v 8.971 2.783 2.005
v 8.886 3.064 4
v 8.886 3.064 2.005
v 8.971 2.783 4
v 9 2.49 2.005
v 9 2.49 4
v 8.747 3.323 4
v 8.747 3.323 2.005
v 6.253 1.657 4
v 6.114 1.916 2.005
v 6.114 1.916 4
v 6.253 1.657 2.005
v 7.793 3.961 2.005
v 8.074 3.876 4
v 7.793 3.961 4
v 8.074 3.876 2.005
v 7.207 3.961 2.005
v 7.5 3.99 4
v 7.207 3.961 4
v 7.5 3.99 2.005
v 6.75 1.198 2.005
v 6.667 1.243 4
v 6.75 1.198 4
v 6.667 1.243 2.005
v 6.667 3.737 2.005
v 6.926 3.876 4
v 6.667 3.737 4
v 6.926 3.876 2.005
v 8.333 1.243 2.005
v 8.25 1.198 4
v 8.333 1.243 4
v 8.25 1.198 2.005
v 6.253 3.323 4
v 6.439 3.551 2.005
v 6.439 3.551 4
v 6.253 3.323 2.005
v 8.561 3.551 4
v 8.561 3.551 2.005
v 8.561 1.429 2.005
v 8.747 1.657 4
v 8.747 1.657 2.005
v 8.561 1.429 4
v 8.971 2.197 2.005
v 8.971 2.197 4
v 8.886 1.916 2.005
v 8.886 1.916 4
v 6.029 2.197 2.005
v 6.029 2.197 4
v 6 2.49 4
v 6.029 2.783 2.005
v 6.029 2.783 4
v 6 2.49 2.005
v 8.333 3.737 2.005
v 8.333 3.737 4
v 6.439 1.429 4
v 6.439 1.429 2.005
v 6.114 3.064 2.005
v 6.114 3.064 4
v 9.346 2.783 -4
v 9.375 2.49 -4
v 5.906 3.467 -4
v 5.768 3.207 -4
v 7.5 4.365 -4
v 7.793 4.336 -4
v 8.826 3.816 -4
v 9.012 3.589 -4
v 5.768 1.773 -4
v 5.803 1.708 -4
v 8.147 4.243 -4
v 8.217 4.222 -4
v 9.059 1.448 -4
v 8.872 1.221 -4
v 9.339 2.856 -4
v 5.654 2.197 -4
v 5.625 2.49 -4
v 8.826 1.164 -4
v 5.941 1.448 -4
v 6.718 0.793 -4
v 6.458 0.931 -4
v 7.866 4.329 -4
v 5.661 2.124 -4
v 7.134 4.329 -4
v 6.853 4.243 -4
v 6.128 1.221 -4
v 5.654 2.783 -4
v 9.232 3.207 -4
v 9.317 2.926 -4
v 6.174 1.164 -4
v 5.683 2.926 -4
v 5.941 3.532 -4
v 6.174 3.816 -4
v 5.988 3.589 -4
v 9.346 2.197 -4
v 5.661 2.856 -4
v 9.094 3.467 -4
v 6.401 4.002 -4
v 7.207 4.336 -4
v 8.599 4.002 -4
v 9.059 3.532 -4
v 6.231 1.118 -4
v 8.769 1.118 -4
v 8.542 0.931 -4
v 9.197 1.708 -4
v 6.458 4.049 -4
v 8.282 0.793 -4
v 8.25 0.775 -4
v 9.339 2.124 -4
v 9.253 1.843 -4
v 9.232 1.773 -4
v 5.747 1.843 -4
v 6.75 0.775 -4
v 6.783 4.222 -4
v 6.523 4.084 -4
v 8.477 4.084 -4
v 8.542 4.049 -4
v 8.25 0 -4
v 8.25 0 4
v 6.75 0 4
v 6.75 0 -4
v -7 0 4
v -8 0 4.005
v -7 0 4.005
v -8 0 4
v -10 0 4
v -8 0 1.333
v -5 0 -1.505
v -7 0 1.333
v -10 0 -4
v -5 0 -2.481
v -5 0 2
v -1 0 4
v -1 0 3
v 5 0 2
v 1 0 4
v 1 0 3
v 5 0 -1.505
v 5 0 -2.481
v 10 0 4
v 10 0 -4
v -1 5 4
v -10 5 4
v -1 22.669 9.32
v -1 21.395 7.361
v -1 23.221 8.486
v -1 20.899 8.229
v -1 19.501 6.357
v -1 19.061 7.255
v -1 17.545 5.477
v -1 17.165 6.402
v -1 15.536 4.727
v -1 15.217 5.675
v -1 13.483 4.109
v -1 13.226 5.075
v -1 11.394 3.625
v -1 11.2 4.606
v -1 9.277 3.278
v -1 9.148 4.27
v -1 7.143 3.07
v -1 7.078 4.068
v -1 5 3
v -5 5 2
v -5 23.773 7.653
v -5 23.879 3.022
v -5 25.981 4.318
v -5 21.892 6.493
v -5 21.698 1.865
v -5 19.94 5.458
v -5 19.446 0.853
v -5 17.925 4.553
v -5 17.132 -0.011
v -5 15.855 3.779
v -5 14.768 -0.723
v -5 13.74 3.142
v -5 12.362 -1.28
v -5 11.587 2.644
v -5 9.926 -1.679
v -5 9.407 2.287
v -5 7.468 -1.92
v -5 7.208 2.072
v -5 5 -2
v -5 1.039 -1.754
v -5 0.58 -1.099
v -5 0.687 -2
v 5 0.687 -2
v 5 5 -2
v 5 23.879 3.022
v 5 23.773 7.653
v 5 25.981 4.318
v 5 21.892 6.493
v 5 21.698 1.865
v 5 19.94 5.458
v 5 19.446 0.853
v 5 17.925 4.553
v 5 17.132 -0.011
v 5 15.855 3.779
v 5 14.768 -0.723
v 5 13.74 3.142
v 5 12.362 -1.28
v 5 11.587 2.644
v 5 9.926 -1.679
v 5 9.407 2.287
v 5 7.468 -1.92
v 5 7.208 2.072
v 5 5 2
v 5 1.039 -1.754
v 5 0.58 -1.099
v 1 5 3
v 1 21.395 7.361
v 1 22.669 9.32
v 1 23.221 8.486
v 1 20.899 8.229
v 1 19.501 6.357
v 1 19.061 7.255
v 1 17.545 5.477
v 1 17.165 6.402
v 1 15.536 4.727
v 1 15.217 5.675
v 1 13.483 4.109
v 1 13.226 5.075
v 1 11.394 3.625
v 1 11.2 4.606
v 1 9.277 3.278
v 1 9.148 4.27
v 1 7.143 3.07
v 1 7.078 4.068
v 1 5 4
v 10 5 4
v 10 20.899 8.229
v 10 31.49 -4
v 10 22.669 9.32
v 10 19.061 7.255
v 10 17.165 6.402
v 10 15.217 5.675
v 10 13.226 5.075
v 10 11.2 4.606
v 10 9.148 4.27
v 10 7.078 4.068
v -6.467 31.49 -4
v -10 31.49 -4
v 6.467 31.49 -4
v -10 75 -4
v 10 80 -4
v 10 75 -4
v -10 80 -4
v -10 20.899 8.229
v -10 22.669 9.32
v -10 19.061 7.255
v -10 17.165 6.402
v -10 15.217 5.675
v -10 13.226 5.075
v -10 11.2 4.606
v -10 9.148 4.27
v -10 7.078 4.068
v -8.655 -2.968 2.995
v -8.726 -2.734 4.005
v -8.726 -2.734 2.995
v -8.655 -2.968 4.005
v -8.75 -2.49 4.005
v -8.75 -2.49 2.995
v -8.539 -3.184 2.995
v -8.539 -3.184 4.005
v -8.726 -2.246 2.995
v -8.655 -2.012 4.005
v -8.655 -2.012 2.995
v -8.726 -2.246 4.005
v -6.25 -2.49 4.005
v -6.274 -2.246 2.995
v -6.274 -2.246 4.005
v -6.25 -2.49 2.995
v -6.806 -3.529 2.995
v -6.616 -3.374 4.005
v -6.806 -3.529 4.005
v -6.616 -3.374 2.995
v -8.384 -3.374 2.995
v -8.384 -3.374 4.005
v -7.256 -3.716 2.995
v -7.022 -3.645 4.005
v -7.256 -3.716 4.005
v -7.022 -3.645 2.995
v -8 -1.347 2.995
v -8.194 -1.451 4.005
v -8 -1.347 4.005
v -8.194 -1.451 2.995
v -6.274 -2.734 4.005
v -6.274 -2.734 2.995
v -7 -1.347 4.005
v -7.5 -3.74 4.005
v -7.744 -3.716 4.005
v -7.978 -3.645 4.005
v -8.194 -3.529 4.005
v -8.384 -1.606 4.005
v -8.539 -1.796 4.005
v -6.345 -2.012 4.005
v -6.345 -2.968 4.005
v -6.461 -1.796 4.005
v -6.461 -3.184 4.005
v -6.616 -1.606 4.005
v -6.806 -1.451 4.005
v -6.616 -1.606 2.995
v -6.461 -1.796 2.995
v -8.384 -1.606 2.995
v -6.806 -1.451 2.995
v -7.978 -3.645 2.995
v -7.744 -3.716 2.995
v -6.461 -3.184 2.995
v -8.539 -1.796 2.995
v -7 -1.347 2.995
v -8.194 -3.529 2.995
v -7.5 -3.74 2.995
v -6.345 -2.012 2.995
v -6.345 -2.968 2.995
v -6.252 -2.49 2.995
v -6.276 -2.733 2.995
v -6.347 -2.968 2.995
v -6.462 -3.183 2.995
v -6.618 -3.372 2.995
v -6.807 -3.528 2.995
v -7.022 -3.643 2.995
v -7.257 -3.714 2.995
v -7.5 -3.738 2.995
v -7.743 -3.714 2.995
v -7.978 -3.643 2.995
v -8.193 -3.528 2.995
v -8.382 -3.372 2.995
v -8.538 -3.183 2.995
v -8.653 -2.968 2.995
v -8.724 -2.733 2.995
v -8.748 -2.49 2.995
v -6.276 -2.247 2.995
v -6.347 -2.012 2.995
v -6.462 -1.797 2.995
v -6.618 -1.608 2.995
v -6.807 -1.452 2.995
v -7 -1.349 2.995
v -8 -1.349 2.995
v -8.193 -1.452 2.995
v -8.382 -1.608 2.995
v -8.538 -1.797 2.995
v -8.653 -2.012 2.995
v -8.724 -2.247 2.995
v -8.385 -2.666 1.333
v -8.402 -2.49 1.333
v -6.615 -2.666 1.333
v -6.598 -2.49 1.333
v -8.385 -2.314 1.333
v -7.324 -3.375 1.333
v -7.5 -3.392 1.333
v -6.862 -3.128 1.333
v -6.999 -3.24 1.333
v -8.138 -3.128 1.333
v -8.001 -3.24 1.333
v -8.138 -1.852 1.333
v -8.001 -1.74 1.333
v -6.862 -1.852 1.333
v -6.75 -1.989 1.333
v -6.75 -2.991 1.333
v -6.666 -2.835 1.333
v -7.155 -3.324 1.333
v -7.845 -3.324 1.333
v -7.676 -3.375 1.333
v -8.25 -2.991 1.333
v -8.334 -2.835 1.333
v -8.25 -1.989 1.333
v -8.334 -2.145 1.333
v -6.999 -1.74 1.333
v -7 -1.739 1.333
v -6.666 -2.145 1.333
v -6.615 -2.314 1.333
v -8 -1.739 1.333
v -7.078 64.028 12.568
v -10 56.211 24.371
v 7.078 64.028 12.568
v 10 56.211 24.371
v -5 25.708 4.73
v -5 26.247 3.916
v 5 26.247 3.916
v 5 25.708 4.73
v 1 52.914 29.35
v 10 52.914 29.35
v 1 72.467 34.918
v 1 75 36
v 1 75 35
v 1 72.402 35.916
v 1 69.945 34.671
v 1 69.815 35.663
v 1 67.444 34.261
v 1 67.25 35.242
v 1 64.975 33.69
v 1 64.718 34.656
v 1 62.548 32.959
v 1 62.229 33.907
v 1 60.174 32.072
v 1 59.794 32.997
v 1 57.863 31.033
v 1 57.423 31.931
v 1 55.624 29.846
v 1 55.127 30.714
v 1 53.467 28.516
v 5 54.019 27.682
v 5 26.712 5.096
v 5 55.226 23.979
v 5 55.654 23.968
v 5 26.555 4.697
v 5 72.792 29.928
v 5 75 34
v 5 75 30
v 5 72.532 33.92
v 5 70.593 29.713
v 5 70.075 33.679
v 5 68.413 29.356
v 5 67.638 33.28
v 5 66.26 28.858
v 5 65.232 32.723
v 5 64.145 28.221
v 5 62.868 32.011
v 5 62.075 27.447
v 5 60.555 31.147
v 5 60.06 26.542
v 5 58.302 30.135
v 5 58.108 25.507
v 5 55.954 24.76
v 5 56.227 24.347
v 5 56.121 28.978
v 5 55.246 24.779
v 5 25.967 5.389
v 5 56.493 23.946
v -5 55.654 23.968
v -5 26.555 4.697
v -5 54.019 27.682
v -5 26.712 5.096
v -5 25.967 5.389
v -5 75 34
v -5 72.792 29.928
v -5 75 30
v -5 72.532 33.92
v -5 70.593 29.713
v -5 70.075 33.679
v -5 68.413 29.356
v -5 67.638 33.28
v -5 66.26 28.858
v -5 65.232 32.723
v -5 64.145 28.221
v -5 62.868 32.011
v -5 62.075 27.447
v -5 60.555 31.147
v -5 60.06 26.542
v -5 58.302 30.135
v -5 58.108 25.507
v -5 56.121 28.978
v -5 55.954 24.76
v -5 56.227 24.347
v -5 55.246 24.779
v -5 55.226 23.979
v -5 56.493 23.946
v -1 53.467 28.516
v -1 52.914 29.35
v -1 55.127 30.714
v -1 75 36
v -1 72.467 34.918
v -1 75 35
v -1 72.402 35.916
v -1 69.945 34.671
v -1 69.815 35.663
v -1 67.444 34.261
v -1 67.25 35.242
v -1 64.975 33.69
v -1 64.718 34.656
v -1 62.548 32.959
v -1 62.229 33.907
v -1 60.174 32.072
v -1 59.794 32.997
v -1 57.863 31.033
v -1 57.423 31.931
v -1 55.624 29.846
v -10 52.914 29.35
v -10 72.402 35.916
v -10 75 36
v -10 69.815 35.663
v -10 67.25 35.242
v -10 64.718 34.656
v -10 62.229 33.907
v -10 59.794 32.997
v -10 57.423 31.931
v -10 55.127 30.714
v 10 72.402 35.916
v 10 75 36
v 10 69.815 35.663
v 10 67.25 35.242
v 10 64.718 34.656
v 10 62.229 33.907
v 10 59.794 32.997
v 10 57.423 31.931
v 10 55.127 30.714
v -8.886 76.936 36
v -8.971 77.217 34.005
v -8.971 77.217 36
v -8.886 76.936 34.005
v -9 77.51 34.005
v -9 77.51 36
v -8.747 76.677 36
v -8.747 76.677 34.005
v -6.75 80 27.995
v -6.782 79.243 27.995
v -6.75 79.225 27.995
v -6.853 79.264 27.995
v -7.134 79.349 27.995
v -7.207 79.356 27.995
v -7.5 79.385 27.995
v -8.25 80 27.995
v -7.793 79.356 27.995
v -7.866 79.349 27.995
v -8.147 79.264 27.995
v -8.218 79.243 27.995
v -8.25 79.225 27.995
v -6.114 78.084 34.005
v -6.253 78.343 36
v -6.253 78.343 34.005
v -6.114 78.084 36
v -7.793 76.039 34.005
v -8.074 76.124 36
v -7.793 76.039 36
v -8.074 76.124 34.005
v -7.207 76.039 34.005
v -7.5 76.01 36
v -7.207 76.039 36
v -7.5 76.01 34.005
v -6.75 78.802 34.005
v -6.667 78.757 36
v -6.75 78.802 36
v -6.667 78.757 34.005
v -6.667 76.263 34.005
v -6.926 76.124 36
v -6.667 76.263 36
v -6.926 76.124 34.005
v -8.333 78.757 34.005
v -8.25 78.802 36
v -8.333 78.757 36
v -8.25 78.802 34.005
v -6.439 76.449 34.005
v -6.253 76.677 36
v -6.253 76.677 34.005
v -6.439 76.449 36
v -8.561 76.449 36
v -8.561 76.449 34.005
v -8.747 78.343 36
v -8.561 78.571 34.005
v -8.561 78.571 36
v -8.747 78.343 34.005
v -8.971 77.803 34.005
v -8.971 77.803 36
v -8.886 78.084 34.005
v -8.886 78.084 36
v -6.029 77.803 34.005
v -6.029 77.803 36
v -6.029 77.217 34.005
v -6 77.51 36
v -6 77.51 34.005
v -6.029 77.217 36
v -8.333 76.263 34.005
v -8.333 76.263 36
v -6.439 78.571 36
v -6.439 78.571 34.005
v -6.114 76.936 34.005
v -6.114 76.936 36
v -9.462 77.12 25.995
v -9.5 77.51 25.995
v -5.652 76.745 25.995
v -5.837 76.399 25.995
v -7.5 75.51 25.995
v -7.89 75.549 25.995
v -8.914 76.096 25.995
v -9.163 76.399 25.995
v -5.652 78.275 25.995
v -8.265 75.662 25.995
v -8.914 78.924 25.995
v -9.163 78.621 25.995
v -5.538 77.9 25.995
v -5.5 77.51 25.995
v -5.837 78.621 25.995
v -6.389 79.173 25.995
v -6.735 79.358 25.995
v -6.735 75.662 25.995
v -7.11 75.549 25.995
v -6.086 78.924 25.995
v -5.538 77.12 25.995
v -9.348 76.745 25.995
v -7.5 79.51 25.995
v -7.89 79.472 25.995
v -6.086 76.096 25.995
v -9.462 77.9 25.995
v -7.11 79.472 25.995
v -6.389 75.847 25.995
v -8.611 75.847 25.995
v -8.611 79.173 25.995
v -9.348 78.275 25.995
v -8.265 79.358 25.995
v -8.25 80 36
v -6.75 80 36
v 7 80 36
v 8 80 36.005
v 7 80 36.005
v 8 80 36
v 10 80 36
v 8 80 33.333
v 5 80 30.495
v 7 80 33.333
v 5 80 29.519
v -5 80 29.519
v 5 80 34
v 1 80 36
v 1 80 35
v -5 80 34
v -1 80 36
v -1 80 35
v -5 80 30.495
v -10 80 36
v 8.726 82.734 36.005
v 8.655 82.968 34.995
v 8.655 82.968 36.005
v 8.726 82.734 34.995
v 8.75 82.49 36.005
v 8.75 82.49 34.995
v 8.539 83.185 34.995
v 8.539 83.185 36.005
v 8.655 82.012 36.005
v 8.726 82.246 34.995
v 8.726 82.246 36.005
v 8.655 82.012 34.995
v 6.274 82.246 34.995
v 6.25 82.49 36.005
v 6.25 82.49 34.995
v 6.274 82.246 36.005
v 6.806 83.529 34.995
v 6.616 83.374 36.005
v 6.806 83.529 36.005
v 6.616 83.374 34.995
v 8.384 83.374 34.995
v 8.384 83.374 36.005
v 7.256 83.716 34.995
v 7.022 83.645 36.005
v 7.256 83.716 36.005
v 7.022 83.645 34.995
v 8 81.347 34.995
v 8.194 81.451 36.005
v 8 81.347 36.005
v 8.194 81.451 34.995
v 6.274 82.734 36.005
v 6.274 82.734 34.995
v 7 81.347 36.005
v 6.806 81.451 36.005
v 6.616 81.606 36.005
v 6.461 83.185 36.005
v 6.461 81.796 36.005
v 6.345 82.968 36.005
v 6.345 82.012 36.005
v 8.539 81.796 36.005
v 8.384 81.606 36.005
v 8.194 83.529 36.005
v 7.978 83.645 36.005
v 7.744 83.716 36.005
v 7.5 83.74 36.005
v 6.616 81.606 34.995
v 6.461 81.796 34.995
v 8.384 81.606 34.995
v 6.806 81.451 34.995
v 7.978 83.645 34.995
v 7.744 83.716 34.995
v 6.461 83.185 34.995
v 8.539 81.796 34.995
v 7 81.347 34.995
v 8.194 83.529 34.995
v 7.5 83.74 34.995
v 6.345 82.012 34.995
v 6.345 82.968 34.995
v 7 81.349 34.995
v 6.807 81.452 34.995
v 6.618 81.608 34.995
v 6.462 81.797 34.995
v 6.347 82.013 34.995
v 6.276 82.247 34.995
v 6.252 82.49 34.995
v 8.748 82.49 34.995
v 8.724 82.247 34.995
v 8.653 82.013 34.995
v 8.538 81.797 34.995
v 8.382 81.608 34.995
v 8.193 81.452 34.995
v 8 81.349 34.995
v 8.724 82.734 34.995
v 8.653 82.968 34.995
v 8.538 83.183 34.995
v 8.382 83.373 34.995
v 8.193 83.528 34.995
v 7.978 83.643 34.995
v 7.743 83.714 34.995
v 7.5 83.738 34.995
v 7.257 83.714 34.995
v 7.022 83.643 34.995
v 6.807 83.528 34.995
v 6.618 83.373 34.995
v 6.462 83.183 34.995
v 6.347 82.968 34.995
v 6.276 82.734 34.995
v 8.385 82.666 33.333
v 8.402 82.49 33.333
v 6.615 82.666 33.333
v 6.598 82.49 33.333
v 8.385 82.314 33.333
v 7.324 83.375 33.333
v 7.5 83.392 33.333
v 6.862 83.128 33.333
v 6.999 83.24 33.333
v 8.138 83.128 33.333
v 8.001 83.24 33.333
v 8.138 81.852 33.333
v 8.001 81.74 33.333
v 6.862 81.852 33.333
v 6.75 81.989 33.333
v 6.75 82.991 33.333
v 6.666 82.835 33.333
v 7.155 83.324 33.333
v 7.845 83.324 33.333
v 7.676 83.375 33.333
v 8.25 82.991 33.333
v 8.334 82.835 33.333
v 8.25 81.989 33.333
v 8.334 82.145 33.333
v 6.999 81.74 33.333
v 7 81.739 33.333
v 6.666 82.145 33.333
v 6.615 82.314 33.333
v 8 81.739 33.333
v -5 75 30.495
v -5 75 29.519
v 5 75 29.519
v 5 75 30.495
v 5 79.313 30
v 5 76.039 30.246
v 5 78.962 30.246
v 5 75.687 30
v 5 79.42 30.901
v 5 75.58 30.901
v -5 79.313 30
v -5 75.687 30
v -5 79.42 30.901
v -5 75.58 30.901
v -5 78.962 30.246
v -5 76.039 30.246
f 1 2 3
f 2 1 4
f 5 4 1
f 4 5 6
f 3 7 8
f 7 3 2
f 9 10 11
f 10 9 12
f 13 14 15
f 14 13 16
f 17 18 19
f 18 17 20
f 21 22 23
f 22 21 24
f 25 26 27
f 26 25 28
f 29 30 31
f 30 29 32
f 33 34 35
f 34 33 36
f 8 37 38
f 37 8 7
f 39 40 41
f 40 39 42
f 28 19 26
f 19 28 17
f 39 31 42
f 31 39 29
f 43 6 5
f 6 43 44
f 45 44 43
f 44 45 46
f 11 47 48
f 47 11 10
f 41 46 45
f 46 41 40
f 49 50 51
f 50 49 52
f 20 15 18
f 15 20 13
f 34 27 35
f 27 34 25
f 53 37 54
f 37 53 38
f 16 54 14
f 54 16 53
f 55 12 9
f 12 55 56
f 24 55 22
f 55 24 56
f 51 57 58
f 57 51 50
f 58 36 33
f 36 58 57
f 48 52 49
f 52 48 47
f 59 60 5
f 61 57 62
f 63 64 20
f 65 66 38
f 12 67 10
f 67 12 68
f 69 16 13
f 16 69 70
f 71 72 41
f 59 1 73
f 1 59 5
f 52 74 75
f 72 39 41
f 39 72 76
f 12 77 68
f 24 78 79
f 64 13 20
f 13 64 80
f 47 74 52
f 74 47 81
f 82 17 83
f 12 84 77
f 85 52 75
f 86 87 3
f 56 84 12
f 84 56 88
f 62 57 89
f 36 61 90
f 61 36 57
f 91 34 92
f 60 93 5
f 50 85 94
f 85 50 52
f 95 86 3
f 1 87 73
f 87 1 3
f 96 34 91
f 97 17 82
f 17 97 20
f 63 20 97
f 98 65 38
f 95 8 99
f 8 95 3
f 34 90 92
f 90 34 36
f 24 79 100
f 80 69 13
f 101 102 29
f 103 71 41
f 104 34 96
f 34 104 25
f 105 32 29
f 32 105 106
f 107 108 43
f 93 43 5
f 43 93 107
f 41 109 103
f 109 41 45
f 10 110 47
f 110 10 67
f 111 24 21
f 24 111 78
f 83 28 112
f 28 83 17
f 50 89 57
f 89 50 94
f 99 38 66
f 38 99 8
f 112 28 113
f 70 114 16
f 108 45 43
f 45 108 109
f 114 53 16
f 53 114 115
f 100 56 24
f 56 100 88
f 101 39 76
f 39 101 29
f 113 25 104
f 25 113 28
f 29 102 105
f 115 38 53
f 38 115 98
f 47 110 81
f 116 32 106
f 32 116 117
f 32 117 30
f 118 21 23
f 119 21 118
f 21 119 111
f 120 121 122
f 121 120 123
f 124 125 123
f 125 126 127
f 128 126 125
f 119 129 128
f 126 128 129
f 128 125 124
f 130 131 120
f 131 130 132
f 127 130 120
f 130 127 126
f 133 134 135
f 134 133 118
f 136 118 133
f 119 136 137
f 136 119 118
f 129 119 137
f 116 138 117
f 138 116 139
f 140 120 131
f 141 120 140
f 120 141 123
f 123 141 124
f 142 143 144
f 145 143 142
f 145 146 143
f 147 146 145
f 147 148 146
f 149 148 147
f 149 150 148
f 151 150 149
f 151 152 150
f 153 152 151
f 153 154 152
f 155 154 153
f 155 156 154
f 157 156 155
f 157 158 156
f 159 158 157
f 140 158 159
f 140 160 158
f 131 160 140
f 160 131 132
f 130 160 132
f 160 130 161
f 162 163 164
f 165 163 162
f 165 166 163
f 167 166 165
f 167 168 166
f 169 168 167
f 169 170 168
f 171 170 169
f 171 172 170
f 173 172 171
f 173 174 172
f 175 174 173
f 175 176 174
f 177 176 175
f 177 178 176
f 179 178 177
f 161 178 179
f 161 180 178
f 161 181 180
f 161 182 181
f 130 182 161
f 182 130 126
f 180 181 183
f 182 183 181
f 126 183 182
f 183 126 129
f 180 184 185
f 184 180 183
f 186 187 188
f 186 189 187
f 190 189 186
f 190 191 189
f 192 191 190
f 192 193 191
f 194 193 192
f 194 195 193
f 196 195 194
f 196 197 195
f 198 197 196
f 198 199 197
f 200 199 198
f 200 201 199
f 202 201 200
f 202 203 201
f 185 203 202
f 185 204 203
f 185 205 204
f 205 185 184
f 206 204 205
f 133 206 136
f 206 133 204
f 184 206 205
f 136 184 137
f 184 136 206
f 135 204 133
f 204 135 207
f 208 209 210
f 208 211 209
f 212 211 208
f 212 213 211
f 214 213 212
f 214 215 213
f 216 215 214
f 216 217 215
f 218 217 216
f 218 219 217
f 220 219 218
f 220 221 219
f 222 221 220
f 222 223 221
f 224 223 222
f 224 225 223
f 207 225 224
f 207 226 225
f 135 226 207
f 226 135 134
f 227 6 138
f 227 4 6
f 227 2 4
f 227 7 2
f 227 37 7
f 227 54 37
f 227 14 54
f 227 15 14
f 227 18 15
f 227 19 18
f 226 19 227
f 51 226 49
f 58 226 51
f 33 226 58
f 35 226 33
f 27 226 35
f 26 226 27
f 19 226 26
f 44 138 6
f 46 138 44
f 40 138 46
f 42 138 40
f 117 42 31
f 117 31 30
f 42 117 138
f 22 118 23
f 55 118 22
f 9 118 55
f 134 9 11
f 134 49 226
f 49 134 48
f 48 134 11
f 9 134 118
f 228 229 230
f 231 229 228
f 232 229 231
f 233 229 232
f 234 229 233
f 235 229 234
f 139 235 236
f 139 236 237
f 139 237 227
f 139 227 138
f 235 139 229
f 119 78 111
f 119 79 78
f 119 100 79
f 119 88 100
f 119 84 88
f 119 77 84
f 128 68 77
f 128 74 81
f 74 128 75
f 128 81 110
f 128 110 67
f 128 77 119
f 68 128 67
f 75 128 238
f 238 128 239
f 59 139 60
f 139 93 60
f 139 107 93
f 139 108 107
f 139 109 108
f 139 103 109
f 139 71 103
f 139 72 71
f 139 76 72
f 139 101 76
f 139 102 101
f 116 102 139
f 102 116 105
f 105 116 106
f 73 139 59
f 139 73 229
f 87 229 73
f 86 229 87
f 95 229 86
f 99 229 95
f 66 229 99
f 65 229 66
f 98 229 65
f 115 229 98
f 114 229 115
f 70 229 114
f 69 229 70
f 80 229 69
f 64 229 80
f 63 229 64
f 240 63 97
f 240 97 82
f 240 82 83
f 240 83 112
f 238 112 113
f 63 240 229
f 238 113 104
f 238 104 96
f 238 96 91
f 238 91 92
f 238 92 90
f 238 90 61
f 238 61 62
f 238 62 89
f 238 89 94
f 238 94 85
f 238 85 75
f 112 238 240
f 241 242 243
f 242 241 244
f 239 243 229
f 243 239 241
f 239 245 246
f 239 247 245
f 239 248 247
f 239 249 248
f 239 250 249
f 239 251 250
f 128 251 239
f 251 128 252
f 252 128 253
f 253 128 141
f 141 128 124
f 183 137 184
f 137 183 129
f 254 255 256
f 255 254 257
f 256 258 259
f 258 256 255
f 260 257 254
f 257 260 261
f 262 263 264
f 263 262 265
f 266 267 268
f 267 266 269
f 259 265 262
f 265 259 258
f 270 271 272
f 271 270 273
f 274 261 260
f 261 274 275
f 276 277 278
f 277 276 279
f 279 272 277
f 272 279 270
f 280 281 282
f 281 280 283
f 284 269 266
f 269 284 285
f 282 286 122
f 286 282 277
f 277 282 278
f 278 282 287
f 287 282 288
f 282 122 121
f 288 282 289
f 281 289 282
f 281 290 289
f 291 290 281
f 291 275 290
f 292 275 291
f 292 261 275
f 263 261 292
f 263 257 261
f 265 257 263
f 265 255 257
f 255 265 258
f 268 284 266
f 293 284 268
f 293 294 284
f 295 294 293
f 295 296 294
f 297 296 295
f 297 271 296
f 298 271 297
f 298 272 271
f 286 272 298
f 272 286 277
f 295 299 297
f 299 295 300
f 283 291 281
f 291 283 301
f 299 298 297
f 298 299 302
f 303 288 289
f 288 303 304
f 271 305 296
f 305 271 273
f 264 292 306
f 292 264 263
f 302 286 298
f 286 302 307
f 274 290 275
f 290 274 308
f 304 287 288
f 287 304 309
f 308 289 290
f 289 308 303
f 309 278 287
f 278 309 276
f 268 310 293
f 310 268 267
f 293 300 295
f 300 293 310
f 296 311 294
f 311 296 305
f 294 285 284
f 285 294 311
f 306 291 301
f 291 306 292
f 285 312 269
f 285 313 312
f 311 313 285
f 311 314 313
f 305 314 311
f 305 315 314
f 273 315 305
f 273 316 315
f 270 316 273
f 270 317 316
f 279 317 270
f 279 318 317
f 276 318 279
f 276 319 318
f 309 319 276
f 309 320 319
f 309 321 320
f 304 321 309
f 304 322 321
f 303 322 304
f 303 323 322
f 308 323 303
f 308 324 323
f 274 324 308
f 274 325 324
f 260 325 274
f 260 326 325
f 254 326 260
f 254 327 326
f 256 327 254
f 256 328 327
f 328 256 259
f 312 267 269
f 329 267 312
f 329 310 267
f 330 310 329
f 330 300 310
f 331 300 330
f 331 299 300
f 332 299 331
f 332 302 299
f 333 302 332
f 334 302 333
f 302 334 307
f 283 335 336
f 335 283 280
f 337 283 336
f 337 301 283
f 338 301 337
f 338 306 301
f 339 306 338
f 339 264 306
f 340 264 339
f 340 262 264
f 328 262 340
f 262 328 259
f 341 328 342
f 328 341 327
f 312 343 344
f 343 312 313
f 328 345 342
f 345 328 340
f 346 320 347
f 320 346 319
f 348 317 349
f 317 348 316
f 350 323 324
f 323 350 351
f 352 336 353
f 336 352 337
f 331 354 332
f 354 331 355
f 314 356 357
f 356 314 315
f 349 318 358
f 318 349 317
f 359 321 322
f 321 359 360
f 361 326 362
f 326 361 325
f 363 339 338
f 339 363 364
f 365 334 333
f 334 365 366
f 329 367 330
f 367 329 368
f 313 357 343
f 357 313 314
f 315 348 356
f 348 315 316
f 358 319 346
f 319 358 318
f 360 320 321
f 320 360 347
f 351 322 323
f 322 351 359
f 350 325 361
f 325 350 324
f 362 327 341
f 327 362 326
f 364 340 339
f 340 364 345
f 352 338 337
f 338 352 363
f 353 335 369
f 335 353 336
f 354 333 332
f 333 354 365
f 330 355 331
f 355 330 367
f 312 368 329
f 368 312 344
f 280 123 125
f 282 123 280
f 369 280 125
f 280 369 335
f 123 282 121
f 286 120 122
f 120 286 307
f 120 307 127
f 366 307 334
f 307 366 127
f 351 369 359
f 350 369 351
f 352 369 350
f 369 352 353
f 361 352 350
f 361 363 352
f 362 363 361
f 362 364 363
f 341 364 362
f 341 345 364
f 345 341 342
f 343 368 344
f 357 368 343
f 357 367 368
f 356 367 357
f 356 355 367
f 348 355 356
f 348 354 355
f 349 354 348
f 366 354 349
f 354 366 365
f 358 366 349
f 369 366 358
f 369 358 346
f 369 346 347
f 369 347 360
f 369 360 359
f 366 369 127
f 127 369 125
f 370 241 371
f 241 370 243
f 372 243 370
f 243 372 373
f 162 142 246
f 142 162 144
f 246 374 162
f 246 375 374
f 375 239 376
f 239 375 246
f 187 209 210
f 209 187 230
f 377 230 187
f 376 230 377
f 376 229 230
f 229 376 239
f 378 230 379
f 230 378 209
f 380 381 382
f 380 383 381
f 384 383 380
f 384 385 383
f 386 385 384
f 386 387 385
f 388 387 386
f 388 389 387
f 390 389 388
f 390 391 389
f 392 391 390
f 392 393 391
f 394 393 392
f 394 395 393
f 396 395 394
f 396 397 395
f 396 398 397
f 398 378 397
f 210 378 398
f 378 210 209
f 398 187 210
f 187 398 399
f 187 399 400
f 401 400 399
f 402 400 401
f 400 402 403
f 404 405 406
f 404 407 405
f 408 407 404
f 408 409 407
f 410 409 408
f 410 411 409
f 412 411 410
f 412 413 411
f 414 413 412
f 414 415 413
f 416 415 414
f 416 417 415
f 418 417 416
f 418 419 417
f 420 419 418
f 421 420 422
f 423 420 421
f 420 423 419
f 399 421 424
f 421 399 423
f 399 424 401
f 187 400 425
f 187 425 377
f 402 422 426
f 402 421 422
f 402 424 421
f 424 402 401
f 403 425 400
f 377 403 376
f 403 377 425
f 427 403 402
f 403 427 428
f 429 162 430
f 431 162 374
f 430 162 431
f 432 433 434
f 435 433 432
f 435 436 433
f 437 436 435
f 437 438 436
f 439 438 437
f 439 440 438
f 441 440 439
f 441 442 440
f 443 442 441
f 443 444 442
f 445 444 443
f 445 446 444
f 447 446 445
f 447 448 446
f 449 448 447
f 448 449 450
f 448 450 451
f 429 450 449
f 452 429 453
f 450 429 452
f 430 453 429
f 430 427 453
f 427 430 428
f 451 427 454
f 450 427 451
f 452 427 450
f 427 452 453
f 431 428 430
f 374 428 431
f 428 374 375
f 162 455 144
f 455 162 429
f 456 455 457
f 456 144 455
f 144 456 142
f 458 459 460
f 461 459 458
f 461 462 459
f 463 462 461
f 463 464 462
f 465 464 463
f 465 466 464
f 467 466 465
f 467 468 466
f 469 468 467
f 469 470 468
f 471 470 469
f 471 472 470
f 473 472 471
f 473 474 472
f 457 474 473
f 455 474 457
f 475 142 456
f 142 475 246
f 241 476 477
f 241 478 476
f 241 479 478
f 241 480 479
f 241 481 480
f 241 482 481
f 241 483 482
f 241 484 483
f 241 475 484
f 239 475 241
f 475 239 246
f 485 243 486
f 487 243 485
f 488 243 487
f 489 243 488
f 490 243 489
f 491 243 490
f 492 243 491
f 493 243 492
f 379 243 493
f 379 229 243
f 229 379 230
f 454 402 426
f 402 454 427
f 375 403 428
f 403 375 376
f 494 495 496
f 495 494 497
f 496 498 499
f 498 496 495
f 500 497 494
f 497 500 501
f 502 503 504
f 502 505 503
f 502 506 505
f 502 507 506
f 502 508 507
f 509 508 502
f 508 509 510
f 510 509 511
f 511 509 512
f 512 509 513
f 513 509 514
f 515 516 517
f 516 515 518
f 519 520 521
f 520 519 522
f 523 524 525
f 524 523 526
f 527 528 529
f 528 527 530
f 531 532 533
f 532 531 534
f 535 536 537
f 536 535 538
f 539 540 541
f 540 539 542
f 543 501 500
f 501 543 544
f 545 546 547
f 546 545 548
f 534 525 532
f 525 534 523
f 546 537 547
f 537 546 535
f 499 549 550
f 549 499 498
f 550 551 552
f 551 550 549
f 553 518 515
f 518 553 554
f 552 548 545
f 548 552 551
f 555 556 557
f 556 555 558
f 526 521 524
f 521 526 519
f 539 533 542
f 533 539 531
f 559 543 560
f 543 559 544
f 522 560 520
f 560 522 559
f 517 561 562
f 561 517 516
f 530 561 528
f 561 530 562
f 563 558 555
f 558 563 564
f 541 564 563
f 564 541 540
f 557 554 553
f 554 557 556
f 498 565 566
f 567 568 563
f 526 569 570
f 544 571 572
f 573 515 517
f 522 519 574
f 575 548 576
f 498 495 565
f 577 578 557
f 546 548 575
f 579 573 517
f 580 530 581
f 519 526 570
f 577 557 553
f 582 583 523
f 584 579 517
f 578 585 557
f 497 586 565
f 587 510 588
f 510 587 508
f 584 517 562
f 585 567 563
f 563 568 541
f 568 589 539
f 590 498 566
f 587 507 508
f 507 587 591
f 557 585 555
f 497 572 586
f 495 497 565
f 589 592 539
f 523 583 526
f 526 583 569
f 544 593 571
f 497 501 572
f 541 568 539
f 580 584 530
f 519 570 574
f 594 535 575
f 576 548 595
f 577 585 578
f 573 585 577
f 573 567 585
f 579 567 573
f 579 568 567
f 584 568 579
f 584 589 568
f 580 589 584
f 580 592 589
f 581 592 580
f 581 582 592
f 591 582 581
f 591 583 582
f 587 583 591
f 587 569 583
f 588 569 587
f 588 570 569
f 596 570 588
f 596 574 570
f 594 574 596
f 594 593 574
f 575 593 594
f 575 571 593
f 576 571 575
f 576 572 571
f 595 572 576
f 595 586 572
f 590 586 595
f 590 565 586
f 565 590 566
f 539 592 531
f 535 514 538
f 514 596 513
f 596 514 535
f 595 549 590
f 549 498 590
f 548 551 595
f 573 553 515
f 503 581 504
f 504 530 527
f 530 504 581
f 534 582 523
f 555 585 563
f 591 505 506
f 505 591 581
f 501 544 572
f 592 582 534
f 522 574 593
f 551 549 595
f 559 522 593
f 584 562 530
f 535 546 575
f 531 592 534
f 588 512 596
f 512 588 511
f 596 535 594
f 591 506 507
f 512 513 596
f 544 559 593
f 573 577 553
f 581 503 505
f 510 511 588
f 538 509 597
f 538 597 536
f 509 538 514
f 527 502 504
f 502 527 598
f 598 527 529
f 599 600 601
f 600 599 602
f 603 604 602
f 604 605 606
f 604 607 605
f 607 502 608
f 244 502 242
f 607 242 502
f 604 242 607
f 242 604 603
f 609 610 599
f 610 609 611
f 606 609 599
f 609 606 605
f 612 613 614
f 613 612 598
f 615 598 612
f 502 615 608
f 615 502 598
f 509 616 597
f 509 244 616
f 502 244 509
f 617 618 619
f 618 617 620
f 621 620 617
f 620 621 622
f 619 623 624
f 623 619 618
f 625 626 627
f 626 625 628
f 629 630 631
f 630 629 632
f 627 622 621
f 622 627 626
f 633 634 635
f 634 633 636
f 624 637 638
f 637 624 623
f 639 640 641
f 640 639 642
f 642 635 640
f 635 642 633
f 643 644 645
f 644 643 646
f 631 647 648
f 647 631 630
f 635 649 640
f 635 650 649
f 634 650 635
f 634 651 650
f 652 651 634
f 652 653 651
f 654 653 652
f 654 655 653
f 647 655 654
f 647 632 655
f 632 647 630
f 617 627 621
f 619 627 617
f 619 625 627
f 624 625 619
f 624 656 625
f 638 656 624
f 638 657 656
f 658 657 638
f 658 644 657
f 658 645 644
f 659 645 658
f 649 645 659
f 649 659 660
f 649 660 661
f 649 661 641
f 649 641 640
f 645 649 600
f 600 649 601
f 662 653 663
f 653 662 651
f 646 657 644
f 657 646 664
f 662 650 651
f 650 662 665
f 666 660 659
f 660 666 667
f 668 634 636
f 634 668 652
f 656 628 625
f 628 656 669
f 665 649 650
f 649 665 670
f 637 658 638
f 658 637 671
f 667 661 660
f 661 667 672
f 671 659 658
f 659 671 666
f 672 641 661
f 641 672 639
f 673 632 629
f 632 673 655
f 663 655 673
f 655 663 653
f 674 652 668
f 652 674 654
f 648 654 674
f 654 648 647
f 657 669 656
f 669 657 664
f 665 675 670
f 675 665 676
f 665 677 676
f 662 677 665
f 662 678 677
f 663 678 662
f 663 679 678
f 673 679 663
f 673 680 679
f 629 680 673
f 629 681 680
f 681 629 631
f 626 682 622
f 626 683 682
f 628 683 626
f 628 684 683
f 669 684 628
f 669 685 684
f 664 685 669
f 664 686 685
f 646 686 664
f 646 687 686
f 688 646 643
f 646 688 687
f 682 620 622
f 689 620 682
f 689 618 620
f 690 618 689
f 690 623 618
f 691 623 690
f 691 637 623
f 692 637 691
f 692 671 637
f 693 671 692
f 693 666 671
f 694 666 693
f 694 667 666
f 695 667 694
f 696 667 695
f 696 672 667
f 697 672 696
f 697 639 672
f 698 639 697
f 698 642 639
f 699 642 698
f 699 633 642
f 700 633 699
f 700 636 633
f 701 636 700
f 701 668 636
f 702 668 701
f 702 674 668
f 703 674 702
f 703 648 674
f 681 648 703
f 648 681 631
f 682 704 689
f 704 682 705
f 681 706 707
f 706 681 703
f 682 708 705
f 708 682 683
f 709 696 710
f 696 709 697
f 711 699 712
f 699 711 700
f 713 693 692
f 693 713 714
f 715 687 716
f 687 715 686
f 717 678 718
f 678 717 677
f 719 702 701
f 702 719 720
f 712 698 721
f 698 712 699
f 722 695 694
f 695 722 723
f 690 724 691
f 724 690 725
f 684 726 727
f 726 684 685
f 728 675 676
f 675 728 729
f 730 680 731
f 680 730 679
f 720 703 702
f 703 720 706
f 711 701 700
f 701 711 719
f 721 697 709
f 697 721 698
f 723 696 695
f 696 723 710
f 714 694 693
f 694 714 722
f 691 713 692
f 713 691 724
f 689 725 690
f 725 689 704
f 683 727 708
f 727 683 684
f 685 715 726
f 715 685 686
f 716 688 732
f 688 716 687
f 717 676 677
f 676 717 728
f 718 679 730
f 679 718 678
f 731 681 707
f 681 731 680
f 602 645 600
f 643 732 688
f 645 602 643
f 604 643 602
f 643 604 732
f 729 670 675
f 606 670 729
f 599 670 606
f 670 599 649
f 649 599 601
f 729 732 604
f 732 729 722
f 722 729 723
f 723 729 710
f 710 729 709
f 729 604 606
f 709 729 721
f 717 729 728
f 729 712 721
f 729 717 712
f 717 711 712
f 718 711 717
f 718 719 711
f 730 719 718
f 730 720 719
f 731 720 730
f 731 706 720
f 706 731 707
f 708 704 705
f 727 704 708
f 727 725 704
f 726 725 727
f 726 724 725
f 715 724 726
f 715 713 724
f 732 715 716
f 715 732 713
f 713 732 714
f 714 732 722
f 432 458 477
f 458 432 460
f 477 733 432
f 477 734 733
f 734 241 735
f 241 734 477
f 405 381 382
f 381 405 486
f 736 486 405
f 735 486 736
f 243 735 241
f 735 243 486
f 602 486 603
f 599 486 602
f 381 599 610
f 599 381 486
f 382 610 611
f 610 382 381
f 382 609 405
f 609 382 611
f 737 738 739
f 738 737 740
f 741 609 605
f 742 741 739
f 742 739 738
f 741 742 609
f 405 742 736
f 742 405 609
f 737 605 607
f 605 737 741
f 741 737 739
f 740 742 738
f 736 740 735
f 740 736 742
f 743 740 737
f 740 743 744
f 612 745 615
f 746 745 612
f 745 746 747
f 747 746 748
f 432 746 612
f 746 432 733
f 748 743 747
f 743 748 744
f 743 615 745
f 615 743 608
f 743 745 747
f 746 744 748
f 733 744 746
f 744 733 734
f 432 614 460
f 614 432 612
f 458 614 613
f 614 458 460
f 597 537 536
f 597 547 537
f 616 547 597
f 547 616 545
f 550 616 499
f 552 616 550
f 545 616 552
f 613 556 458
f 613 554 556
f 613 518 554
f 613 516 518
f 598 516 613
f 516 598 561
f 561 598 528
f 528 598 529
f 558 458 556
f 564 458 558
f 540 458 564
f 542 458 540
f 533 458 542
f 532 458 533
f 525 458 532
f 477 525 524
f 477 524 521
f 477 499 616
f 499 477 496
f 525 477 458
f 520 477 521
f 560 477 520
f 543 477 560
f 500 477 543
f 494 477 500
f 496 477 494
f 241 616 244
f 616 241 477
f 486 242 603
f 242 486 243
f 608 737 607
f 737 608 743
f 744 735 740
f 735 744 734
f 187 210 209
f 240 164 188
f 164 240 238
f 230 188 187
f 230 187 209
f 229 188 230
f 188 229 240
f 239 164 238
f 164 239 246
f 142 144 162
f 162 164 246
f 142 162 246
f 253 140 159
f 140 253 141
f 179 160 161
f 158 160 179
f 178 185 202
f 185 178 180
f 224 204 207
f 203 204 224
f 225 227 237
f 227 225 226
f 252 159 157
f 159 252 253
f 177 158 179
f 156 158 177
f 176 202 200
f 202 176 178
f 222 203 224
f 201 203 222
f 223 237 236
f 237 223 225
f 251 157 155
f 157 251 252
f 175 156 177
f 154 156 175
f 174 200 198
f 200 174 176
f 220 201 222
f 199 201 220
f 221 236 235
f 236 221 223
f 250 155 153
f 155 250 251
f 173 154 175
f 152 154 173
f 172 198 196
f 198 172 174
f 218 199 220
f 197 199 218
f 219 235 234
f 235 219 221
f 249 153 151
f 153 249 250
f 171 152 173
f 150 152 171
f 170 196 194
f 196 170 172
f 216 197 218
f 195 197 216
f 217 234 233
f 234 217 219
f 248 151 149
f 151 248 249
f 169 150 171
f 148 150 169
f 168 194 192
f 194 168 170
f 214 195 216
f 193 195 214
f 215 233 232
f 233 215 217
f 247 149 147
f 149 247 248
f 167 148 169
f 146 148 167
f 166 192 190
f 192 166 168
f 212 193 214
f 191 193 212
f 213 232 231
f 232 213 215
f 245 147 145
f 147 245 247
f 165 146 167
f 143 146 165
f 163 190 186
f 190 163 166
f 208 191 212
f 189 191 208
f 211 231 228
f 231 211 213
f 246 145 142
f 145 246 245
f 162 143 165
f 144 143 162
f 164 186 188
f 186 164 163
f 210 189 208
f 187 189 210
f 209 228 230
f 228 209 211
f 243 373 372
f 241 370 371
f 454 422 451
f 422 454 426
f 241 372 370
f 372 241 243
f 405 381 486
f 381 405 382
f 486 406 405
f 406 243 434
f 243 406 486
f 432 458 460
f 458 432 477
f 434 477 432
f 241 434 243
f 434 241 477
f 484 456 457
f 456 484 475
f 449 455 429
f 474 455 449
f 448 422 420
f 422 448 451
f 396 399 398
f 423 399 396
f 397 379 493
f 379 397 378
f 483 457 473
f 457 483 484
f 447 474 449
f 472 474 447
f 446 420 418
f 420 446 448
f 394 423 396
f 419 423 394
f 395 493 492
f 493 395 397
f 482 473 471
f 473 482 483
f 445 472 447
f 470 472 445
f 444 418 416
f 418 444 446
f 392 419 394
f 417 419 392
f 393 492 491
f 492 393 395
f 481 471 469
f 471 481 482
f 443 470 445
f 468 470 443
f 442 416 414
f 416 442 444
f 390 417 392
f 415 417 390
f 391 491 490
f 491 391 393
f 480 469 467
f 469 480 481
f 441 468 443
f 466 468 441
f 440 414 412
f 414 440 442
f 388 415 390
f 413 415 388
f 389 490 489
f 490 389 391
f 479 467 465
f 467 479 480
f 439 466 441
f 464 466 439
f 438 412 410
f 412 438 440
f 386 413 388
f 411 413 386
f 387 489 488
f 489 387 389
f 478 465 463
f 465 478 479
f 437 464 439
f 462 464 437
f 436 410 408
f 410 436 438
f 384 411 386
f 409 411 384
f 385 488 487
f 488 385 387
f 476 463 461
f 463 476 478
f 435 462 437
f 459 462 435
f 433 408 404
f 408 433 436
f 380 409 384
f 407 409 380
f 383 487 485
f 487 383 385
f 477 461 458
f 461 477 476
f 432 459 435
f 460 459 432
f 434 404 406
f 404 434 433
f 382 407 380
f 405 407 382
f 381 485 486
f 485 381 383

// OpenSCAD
/*
  ttt_ramp_2.scad
    
  (c) olikraus@gmail.com

  This work is licensed under the Creative Commons Attribution-NonCommercial-ShareAlike 4.0 International License. 
  To view a copy of this license, visit http://creativecommons.org/licenses/by-nc-sa/4.0/.
    
        
  ramp_height must be identical to "height" from <train_tube_track.scad>
*/

include <train_tube_track.scad>;

// the following variables are calculated by ramp_calc.c
ramp_height = 32.000000;
ramp_inner_length = 70.000000;
ramp_radius = 36.000000;
ramp_arc = 33.514179; // degree
ramp_slope = 33.514177; // degree
ramp_straight_length = 36.276711; 
ramp_straight_y = 19.877160;
ramp_straight_z = 5.985029;

difference() {
    union() {
        // left plug
        translate([0,2.50,0])
        rotate([0,0,180])
        straight_track_single_plug(eocstl);

        // first arc
        translate([0, eocstl, ramp_radius])
        rotate([0,90,0])
        rotate_extrude(angle=ramp_arc, convexity = 10, $fn=100) 
        translate([ramp_radius, 0, 0])
        rotate([0,0,90])
        polygon(tube_profile_h);

        // straight slope
        translate([0, eocstl+ramp_straight_y+0.0001, ramp_straight_z])
        rotate([ramp_slope, 0, 0])
        translate([0,ramp_straight_length/2,0 ])
        straight_track_h_no_plug(ramp_straight_length);

        // second arg
        translate([0,eocstl+ramp_inner_length+0.0001, ramp_height])
        translate([0,0, -ramp_radius])
        rotate([ramp_arc,0,0])
        rotate([0,-90,0])
        rotate_extrude(angle=ramp_arc, convexity = 20, $fn=100) 
        translate([ramp_radius, 0, 0])
        rotate([0,0,-90])
        polygon(tube_profile_h);

        // right plug
        translate([0,eocstl+2.5+ramp_inner_length+0.0001, ramp_height])
        straight_track_h_single_plug(eocstl);
    }
    translate([0,grid,-ramp_height/2-outer_height/2])
    cube([outer_width+0.1, grid*3, ramp_height], center=true);
    
}
